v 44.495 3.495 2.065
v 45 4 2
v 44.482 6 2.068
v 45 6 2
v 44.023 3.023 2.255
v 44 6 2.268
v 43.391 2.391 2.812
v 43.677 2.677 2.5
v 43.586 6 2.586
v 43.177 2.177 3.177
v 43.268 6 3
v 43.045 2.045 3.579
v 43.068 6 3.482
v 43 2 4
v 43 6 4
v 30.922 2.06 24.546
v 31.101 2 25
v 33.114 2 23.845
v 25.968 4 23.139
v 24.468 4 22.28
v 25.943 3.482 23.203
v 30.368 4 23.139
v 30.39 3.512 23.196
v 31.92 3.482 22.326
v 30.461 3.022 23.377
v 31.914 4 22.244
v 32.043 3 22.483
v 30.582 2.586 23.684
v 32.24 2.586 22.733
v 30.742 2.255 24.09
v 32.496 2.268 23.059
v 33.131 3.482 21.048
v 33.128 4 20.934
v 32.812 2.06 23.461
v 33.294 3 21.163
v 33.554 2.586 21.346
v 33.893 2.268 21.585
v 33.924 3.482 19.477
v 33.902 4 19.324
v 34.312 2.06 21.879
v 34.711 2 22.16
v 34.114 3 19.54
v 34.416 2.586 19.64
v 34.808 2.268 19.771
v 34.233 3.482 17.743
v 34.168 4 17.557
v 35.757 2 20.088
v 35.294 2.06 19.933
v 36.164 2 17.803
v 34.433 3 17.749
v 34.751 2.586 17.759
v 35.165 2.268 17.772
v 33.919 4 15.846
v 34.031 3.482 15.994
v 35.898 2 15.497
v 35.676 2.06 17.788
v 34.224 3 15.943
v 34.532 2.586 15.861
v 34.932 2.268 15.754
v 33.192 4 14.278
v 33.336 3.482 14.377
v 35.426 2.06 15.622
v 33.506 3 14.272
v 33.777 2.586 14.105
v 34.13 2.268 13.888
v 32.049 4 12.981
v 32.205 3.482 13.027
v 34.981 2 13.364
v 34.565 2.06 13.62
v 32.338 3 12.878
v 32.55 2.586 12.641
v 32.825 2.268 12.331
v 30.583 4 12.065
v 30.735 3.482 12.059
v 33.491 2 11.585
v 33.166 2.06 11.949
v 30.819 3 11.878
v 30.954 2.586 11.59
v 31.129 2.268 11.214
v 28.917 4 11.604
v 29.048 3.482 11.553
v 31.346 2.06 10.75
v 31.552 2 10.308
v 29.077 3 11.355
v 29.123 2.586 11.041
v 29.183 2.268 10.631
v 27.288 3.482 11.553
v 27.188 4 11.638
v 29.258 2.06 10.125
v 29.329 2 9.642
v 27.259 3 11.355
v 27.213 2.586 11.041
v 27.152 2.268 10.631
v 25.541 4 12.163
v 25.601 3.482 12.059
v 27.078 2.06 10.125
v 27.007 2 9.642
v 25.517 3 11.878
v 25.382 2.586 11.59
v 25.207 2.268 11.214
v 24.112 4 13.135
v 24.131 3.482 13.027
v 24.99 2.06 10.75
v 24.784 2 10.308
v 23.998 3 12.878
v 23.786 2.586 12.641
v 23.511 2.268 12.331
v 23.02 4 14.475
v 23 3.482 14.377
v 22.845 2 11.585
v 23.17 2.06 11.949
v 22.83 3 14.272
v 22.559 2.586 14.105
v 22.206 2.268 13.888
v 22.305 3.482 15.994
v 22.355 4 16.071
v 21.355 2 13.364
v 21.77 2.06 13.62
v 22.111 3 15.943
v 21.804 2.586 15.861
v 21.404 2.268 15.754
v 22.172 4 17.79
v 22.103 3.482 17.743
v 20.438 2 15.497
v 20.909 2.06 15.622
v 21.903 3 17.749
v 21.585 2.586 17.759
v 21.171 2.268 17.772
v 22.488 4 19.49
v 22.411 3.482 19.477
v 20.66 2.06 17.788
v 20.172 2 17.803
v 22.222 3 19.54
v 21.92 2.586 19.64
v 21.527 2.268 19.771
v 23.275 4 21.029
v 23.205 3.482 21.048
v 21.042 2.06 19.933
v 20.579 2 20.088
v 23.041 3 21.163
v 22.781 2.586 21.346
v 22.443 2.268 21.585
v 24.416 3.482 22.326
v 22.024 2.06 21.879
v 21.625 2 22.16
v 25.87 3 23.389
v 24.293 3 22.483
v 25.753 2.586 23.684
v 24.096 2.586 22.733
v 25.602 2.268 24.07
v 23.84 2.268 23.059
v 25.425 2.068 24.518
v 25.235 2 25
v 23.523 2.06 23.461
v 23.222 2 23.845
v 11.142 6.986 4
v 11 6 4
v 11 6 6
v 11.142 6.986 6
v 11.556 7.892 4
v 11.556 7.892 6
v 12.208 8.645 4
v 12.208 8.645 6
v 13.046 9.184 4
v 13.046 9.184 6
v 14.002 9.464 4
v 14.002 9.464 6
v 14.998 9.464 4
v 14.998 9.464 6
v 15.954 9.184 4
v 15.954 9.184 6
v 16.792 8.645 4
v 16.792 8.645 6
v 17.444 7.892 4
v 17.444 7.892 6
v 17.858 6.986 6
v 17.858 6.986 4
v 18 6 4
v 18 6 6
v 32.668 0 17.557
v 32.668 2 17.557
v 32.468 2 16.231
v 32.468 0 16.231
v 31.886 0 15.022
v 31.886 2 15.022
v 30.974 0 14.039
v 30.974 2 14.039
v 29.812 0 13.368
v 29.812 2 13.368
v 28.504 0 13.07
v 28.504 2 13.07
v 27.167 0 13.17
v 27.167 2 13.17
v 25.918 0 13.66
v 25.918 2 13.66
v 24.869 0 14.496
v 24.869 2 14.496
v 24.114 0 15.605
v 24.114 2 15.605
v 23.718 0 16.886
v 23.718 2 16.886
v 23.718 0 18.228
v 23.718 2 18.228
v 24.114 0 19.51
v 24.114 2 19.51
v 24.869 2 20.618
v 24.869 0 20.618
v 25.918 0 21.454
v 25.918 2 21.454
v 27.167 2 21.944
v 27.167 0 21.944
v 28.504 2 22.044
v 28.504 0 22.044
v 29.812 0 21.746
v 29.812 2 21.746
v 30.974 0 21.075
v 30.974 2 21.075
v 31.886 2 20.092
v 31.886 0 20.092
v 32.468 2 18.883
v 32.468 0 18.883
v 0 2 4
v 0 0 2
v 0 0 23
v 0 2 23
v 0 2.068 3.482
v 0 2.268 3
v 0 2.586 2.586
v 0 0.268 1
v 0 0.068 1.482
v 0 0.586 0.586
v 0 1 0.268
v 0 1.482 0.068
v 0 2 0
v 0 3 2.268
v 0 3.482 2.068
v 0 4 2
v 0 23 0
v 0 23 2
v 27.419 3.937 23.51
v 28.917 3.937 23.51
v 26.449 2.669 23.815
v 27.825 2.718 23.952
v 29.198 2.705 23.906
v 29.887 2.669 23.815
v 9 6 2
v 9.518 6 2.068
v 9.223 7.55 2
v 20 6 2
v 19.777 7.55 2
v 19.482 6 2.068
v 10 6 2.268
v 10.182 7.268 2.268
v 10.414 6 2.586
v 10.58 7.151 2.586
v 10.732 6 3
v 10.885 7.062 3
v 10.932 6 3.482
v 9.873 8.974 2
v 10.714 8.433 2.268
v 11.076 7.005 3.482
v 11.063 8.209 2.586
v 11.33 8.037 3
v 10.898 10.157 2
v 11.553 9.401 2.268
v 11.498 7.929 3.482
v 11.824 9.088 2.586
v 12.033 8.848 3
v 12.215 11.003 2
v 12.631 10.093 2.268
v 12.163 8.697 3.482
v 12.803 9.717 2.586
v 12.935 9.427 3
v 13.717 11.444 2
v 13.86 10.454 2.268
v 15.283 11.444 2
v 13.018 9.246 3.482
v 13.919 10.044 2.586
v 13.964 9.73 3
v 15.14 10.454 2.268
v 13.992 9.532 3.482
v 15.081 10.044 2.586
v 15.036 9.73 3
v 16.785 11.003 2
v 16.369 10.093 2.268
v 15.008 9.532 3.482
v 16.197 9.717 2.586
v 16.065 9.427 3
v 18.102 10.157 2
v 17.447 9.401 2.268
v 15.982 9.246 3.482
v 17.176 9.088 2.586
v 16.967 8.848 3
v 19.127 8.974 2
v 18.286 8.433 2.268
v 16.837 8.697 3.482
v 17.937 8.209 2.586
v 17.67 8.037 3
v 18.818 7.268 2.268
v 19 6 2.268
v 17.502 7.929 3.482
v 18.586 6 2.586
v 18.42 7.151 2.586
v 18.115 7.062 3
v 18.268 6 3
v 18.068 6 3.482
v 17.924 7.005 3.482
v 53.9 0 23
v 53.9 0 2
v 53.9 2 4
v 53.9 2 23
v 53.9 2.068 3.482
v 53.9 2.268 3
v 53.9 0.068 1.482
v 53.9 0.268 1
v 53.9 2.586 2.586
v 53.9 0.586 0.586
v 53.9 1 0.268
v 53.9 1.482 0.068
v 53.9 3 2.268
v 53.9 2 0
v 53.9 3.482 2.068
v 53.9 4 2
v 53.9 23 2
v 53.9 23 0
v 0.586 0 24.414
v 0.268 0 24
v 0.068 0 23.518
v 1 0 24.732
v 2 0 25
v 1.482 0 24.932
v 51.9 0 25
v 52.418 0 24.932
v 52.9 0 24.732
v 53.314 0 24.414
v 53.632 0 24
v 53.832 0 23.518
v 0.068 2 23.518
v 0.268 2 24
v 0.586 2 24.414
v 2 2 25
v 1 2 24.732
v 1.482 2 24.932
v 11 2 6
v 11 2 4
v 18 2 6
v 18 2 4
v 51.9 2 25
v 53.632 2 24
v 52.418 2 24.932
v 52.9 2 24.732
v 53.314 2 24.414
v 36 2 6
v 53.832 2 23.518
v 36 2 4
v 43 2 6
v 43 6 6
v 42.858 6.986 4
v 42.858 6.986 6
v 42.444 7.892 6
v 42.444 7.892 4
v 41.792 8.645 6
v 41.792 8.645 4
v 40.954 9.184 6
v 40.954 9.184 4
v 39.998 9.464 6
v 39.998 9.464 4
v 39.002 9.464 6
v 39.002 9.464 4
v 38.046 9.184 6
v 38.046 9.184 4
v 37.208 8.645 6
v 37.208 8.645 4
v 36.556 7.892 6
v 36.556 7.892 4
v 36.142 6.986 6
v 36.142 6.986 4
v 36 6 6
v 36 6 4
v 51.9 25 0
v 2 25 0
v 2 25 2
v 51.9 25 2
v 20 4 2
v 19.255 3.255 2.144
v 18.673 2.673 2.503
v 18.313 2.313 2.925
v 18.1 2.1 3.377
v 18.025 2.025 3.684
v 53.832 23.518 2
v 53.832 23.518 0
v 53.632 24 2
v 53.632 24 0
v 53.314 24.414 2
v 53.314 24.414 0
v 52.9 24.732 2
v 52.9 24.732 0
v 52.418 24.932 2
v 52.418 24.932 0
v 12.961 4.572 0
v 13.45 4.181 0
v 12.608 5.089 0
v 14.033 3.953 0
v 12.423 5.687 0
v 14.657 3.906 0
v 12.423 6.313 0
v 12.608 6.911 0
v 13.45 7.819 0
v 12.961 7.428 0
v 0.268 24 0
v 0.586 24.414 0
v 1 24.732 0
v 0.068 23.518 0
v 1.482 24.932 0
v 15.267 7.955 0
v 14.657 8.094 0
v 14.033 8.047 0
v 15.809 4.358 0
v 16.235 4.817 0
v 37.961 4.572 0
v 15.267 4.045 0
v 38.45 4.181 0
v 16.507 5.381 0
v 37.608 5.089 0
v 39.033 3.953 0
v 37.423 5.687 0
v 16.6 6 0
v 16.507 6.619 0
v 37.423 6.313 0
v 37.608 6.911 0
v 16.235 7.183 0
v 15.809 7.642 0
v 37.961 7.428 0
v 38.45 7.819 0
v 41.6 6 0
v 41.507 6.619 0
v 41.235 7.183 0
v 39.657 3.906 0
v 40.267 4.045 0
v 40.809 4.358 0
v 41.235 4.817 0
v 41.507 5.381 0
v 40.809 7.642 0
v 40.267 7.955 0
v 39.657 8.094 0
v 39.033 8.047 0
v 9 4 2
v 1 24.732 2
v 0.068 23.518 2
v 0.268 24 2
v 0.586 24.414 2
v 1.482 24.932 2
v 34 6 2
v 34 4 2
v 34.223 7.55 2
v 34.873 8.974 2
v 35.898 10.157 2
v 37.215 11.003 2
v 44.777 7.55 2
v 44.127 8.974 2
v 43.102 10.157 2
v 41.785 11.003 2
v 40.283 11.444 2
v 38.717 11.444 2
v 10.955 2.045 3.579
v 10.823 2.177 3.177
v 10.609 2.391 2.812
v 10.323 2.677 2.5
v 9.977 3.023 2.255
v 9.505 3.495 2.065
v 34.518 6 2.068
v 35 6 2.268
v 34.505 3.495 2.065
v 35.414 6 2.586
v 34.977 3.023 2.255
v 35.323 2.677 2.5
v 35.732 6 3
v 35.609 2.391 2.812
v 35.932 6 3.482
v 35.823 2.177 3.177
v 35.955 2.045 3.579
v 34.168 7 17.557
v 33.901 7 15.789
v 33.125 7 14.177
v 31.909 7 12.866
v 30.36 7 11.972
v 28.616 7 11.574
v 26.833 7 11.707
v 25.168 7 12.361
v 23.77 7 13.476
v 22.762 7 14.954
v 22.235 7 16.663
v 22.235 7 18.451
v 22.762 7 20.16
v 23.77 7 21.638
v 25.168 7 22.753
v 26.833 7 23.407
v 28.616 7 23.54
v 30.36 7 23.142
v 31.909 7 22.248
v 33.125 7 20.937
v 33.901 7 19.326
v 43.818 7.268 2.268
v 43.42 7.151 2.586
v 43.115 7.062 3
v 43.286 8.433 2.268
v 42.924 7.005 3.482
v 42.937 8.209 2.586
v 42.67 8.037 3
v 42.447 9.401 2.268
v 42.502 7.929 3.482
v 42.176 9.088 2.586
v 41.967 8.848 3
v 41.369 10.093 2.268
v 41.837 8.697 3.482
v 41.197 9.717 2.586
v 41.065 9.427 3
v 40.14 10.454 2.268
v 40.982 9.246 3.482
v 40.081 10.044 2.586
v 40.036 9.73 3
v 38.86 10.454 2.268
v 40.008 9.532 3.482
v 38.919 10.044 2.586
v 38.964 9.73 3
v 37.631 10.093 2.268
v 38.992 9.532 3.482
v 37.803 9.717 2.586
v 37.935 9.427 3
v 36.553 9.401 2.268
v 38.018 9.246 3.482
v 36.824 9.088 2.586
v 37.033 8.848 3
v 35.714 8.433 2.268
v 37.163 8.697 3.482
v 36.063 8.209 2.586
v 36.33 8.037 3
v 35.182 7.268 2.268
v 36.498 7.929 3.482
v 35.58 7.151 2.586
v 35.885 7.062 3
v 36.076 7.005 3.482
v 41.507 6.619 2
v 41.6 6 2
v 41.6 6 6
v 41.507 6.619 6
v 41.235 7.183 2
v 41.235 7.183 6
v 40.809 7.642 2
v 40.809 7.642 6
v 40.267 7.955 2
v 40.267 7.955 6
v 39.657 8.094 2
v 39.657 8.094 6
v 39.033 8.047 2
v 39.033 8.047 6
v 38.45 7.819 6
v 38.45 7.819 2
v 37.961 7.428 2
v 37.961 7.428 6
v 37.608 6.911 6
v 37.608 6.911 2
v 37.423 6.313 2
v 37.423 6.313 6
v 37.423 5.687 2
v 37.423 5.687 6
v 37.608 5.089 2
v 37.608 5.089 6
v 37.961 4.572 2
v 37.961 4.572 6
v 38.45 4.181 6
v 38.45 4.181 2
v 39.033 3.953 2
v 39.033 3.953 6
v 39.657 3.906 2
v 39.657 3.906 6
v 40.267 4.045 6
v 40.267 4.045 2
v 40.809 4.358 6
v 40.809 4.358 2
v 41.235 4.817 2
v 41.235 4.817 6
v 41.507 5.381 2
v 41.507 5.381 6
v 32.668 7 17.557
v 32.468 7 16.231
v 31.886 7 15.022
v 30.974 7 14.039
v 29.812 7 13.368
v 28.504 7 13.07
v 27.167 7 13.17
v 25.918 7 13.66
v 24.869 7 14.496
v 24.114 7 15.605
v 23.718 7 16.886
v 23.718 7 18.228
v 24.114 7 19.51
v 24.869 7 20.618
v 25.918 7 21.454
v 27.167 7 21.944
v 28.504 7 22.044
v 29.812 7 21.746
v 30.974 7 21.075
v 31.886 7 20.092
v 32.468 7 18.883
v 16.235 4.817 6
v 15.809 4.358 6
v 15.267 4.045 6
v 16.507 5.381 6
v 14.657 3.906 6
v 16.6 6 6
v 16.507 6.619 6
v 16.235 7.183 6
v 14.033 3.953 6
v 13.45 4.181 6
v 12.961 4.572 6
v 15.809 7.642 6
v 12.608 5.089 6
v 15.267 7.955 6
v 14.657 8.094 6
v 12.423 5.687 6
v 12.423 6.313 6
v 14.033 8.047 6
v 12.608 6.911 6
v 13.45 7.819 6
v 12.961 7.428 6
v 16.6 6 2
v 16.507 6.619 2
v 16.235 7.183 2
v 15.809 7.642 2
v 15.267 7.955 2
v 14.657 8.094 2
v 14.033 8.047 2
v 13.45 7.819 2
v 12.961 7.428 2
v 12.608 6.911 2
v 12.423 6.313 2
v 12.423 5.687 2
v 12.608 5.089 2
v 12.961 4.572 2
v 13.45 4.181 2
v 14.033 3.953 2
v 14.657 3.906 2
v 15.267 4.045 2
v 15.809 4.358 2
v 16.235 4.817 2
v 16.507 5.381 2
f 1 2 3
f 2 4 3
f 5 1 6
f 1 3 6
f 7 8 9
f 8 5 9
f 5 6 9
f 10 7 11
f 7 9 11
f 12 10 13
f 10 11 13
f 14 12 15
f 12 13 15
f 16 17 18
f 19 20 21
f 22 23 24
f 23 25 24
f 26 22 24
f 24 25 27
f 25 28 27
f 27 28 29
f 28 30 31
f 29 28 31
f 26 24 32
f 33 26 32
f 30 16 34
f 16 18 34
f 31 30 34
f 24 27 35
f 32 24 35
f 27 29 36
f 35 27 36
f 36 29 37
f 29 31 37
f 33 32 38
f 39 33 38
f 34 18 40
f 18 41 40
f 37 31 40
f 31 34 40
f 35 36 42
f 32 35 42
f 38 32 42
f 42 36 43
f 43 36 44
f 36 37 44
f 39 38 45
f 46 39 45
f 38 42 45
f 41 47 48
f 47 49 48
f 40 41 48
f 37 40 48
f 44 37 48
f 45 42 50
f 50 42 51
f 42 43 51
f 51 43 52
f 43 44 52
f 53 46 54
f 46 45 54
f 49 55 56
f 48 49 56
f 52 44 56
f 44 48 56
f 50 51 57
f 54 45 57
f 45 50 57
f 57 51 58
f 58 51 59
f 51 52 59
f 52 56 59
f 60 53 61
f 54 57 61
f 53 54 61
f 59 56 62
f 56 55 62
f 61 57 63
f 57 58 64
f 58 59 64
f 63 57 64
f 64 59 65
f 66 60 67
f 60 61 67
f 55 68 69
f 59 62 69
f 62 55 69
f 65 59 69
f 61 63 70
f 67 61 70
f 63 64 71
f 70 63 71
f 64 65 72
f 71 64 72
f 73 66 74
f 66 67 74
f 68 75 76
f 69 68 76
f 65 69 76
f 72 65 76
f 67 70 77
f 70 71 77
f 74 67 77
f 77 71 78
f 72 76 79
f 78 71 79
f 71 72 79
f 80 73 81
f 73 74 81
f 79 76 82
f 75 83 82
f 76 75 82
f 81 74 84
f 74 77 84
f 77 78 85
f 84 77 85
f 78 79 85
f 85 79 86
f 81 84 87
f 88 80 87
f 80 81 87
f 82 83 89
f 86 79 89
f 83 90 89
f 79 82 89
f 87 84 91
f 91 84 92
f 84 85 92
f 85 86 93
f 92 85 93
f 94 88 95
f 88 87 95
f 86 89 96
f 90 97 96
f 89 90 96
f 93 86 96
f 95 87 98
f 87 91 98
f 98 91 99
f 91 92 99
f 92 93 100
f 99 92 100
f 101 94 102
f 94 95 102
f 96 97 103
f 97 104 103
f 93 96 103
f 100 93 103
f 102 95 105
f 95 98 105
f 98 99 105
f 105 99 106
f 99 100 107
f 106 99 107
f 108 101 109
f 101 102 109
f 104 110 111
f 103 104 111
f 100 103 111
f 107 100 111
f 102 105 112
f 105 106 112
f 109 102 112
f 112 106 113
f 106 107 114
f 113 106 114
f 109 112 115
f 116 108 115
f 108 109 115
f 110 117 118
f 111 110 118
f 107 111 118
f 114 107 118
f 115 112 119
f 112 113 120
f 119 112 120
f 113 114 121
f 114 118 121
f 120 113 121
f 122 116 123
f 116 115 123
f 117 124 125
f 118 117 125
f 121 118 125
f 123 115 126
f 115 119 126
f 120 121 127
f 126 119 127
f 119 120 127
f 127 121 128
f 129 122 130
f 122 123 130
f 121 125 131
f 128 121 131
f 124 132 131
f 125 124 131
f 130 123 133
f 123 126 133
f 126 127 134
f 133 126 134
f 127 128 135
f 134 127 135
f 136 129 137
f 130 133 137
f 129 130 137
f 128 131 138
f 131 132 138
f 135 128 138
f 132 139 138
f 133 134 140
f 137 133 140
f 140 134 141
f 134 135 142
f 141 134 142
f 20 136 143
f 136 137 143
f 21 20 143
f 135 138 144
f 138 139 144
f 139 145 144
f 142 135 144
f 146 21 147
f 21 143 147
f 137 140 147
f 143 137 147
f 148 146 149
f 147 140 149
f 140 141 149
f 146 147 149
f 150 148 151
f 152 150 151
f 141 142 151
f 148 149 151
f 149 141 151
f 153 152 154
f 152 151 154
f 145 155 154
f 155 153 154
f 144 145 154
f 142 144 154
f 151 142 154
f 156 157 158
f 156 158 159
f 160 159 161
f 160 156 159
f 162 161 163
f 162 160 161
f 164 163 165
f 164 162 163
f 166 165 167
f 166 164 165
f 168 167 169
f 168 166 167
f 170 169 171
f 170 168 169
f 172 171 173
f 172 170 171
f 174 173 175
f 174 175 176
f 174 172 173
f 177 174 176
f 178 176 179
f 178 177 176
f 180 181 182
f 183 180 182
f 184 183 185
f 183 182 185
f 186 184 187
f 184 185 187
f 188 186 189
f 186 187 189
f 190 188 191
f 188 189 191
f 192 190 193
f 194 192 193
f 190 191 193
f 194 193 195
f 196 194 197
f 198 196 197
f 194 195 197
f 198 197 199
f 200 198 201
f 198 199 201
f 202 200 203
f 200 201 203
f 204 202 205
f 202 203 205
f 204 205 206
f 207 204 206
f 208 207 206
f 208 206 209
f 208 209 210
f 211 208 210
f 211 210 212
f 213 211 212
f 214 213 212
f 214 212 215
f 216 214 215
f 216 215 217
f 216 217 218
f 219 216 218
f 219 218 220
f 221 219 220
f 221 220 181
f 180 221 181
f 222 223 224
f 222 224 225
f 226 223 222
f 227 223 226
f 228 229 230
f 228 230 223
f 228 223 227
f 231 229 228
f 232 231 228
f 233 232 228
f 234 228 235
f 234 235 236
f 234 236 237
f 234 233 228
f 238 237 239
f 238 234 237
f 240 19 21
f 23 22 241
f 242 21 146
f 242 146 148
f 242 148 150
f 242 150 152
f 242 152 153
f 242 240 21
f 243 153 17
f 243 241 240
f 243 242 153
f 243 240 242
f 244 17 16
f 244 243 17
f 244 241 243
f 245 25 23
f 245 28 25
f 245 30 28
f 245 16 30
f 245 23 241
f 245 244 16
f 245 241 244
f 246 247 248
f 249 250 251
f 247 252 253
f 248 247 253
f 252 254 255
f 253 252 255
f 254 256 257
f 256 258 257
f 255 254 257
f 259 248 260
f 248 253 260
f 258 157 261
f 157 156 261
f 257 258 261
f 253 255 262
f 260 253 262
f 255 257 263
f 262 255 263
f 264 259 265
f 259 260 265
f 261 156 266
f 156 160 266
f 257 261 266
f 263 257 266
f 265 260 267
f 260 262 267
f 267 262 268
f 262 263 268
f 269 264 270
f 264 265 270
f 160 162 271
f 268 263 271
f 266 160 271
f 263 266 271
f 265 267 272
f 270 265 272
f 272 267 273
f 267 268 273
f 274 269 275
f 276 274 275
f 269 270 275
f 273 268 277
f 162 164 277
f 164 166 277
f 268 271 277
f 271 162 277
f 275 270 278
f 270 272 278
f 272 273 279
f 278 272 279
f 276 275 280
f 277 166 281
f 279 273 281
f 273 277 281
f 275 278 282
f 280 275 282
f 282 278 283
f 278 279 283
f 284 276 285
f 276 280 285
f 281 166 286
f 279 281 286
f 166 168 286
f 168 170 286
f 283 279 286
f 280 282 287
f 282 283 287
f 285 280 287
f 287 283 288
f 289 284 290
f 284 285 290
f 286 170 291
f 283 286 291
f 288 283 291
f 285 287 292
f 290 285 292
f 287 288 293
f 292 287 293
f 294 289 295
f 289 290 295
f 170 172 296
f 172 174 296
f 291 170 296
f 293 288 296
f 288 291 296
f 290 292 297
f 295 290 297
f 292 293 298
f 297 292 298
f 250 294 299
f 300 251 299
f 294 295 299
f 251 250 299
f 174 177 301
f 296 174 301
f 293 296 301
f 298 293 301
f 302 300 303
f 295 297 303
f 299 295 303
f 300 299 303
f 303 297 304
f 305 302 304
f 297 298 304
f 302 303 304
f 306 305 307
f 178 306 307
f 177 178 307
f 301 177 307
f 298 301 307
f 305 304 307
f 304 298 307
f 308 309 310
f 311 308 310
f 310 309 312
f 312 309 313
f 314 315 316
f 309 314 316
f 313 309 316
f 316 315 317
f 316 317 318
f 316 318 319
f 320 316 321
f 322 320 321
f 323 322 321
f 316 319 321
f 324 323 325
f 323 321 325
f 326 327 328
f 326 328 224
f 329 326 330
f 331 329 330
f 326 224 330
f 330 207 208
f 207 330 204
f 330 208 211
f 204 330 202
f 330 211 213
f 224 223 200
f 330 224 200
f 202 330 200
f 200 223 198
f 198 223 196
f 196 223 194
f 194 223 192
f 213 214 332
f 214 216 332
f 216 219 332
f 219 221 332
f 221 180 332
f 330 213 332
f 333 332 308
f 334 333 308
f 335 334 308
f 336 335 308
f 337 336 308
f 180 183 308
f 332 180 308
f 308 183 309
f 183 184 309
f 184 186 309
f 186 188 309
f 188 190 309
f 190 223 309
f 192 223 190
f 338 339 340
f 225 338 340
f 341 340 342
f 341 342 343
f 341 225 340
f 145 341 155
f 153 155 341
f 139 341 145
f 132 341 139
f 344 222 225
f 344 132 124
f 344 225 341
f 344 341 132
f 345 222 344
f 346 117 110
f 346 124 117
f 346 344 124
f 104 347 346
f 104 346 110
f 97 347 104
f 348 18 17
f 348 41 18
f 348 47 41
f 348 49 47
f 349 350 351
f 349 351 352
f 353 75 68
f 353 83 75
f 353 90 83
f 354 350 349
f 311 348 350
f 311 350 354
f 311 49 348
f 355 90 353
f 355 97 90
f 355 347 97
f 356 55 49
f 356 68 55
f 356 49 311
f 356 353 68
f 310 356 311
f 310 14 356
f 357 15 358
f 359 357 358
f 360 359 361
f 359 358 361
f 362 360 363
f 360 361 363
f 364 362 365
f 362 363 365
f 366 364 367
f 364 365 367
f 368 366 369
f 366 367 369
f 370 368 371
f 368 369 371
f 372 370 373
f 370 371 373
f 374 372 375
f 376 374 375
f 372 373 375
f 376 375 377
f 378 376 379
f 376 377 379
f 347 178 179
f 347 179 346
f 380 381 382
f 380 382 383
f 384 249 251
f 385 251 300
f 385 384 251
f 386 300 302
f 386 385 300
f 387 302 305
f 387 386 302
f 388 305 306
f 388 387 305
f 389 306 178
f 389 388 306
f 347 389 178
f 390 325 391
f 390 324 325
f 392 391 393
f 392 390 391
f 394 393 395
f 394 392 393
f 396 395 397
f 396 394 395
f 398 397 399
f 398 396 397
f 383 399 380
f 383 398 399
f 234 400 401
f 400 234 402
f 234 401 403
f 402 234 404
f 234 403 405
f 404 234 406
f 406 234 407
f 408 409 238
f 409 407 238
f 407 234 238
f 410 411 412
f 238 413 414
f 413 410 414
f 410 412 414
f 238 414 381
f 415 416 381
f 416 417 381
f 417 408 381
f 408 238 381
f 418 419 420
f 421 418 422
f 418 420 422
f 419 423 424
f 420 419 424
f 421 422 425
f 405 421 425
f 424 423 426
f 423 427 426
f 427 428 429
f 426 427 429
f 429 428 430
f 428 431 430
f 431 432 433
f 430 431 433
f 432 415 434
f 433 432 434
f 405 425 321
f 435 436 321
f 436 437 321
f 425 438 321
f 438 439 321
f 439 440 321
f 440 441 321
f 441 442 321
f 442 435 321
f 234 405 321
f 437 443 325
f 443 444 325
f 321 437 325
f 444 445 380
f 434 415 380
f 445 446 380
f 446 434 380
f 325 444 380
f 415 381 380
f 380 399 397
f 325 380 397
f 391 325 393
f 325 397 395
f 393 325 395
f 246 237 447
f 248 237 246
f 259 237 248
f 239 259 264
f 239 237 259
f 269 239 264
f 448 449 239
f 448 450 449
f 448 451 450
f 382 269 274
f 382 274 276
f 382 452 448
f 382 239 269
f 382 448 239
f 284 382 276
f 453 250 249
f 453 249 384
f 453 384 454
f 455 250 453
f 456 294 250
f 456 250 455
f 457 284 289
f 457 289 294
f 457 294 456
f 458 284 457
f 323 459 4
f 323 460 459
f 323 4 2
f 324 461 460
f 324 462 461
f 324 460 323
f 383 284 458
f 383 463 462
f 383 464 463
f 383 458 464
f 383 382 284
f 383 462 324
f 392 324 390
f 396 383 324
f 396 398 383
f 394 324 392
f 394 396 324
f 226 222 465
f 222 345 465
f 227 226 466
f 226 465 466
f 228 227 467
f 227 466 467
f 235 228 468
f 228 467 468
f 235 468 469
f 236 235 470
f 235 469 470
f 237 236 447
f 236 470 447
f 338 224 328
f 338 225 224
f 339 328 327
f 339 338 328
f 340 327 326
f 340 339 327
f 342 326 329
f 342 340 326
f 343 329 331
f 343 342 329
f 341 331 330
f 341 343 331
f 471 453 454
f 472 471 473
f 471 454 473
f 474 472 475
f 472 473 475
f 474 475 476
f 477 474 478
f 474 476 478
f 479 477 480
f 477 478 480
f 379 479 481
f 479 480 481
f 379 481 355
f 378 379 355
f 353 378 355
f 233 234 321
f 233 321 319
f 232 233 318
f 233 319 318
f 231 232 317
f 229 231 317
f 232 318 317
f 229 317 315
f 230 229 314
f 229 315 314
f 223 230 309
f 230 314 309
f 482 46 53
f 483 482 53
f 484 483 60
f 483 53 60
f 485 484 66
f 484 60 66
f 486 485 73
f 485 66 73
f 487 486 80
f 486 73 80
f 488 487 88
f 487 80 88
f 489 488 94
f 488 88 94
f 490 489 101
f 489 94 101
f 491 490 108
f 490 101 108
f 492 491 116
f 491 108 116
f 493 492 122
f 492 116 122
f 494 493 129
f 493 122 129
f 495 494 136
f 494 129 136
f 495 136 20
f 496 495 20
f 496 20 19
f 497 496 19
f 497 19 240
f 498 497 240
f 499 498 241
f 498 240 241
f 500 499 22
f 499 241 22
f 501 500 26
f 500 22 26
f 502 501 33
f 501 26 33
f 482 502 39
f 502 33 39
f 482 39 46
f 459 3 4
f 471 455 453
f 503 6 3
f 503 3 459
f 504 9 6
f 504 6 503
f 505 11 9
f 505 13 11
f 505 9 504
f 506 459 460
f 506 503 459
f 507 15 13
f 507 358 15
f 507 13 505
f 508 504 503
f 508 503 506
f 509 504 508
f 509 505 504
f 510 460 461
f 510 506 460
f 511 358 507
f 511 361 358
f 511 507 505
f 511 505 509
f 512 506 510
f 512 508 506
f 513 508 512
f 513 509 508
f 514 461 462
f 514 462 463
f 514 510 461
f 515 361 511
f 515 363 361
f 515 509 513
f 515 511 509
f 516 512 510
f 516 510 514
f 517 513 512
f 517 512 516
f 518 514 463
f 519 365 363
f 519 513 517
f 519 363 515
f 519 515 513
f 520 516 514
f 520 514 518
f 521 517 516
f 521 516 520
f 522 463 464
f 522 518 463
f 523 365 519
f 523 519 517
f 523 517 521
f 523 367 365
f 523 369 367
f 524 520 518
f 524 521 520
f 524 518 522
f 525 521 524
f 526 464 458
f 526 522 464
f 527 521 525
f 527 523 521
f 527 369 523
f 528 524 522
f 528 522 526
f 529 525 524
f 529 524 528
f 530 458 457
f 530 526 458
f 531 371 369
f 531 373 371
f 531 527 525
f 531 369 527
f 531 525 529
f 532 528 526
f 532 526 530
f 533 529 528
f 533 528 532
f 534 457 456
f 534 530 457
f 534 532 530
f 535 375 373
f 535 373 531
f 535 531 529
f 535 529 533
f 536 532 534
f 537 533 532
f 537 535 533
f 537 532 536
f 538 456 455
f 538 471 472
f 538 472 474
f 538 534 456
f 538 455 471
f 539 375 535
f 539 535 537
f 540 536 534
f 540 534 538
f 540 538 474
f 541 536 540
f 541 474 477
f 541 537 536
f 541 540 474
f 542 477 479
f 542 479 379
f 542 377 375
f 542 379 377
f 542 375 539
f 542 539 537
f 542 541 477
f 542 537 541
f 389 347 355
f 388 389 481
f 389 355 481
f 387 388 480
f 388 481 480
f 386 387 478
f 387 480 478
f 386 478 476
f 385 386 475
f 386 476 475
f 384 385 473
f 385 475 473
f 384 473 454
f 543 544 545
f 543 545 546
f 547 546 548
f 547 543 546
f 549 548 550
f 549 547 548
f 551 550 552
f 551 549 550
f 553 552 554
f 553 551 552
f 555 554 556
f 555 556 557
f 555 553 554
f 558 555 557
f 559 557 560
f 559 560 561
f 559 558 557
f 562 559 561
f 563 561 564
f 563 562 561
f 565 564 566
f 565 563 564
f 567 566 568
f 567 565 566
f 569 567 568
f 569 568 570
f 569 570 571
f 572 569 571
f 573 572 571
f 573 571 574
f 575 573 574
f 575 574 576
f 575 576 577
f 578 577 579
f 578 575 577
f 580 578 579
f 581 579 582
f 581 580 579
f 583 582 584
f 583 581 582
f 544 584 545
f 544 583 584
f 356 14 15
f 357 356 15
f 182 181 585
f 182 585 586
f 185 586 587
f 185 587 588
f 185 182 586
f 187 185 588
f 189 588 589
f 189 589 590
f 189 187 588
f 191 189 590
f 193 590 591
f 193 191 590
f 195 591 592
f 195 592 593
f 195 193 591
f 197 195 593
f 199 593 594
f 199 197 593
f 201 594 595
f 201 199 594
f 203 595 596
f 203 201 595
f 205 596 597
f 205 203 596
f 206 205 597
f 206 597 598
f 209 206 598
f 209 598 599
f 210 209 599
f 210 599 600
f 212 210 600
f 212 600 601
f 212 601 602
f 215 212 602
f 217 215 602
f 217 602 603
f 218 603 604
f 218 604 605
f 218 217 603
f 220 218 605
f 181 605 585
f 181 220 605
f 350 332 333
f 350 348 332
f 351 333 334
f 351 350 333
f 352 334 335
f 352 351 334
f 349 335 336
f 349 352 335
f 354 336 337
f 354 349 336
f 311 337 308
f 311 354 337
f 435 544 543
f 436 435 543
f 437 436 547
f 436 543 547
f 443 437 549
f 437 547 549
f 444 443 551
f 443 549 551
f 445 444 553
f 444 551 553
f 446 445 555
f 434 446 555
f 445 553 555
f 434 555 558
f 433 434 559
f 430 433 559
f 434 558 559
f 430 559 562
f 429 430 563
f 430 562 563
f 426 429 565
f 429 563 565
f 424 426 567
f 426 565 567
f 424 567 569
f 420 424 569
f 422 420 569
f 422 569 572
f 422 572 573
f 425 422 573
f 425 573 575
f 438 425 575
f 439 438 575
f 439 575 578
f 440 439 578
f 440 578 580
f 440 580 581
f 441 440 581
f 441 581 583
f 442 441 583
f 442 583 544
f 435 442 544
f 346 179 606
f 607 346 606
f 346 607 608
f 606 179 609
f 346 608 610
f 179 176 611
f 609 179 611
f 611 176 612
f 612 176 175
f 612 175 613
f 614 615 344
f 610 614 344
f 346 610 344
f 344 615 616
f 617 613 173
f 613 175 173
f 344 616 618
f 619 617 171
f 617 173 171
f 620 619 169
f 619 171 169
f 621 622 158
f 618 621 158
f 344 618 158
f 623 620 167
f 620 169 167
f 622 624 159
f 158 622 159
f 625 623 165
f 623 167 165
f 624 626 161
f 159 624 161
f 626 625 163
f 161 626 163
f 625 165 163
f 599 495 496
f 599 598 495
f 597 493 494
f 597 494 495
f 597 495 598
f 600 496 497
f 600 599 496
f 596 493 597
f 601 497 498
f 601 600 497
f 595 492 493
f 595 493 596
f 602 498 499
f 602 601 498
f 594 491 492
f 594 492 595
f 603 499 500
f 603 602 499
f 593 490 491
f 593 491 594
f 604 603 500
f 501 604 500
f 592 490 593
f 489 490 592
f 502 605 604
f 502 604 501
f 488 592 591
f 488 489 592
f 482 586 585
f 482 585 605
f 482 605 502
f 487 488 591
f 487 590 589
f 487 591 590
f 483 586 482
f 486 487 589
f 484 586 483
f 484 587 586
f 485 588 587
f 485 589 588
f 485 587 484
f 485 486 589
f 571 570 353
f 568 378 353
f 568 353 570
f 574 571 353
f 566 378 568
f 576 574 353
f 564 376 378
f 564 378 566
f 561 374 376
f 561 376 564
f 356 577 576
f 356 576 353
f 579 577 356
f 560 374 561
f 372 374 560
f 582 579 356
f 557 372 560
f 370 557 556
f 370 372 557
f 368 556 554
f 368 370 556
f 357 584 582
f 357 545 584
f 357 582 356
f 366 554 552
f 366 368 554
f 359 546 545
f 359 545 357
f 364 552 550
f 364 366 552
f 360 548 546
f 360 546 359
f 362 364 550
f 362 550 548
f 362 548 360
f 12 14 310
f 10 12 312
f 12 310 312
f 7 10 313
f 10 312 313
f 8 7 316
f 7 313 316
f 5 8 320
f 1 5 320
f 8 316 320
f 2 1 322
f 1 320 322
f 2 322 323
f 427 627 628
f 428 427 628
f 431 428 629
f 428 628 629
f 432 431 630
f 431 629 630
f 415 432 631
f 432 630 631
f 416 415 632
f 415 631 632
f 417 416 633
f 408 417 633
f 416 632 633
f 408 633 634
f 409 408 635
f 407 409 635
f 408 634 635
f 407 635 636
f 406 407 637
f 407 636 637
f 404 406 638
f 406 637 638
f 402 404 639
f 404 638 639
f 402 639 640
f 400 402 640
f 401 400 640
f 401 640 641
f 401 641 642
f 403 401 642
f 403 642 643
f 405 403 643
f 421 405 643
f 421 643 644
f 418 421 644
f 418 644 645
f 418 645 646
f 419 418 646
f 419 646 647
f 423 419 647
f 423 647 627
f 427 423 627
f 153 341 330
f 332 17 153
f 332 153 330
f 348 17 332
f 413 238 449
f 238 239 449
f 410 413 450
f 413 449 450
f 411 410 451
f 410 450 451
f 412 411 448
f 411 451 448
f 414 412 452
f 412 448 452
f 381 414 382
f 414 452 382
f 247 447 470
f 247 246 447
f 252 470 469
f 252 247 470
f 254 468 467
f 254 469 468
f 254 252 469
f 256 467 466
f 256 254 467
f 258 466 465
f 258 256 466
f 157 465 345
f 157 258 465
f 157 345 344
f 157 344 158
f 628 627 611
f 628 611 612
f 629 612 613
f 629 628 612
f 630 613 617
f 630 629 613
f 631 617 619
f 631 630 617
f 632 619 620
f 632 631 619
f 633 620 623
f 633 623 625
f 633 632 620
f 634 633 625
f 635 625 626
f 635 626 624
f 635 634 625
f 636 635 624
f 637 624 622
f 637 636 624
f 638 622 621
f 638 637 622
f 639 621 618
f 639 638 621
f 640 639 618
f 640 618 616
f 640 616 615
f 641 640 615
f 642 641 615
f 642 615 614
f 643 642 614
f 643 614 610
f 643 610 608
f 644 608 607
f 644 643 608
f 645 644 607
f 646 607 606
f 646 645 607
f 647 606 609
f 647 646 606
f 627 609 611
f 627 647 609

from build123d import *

# Parameters (mm, degrees)
SKETCH1_W           = 53.9
SKETCH1_H           = 25
BOSS_EXTRUDE1_DEPTH = 2
SKETCH2_W           = 53.9
SKETCH2_H           = 2
BOSS_EXTRUDE2_DEPTH = 23
SKETCH3_R           = 2.1
CUT_EXTRUDE1_DEPTH  = 3
SKETCH4_R           = 4.5
CUT_EXTRUDE2_DEPTH  = 3
SKETCH5_R           = 2.1
BOSS_EXTRUDE3_DEPTH = 4
SKETCH6_R           = 6
SKETCH6_R_2         = 4.5
BOSS_EXTRUDE4_DEPTH = 5
FILLET1_R           = 2


with BuildPart() as part:
    # Sketch1 → Boss-Extrude1 (new body)
    with BuildSketch(Plane.XY):
        with Locations((26.95, 12.5)):
            Rectangle(SKETCH1_W, SKETCH1_H)
    extrude(amount=BOSS_EXTRUDE1_DEPTH)

    # Sketch2 → Boss-Extrude2 (add)
    with BuildSketch(Plane.XY.offset(2)):
        with Locations((26.95, 1)):
            Rectangle(SKETCH2_W, SKETCH2_H)
    extrude(amount=BOSS_EXTRUDE2_DEPTH)

    # Sketch3 → Cut-Extrude1 (cut, through all)
    with BuildSketch(Plane.XY.offset(2)):
        with Locations((39.5, 6)):
            Circle(SKETCH3_R)
        with Locations((14.5, 6)):
            Circle(SKETCH3_R)
    extrude(amount=-CUT_EXTRUDE1_DEPTH, mode=Mode.SUBTRACT)

    # Sketch4 → Cut-Extrude2 (cut, through all)
    with BuildSketch(Plane(origin=(0, 2, 0), x_dir=(1, 0, 0), z_dir=(0, 1, 0))):
        with Locations((28.167949192, -17.557050808)):
            Circle(SKETCH4_R)
    extrude(amount=-CUT_EXTRUDE2_DEPTH, mode=Mode.SUBTRACT)

    # Sketch5 → Boss-Extrude3 (add)
    with BuildSketch(Plane.XY.offset(2)):
        with BuildLine():
            Line((18, 6), (18, 2))
            Line((18, 2), (11, 2))
            Line((11, 2), (11, 6))
            ThreePointArc((11, 6), (14.5, 9.5), (18, 6))
        make_face()
        with Locations((14.5, 6)):
            Circle(SKETCH5_R, mode=Mode.SUBTRACT)
        with BuildLine():
            Line((36, 6), (36, 2))
            Line((36, 2), (43, 2))
            Line((43, 2), (43, 6))
            ThreePointArc((43, 6), (39.5, 9.5), (36, 6))
        make_face()
        with Locations((39.5, 6)):
            Circle(SKETCH5_R, mode=Mode.SUBTRACT)
    extrude(amount=BOSS_EXTRUDE3_DEPTH)

    # Sketch6 → Boss-Extrude4 (add)
    with BuildSketch(Plane(origin=(0, 2, 0), x_dir=(1, 0, 0), z_dir=(0, 1, 0))):
        with Locations((28.167949192, -17.557050808)):
            Circle(SKETCH6_R)
        with Locations((28.167949192, -17.557050808)):
            Circle(SKETCH6_R_2, mode=Mode.SUBTRACT)
    extrude(amount=BOSS_EXTRUDE4_DEPTH)

    # Fillet1
    fillet1_edges = [part.edges().sort_by_distance(p)[0] for p in [
        (48.45, 2, 2),
        (0, 1, 25),
        (53.9, 1, 25),
        (5.5, 2, 2),
        (14.5, 9.5, 2),
        (11, 4, 2),
        (18, 4, 2),
        (27, 2, 2),
        (26.95, 0, 0),
        (39.5, 9.5, 2),
        (36, 4, 2),
        (43, 4, 2),
        (22.167949192, 2, 17.557050808),
        (0, 25, 1),
        (53.9, 25, 1),
    ]]
    fillet(fillet1_edges, radius=FILLET1_R)


solid = part.part
